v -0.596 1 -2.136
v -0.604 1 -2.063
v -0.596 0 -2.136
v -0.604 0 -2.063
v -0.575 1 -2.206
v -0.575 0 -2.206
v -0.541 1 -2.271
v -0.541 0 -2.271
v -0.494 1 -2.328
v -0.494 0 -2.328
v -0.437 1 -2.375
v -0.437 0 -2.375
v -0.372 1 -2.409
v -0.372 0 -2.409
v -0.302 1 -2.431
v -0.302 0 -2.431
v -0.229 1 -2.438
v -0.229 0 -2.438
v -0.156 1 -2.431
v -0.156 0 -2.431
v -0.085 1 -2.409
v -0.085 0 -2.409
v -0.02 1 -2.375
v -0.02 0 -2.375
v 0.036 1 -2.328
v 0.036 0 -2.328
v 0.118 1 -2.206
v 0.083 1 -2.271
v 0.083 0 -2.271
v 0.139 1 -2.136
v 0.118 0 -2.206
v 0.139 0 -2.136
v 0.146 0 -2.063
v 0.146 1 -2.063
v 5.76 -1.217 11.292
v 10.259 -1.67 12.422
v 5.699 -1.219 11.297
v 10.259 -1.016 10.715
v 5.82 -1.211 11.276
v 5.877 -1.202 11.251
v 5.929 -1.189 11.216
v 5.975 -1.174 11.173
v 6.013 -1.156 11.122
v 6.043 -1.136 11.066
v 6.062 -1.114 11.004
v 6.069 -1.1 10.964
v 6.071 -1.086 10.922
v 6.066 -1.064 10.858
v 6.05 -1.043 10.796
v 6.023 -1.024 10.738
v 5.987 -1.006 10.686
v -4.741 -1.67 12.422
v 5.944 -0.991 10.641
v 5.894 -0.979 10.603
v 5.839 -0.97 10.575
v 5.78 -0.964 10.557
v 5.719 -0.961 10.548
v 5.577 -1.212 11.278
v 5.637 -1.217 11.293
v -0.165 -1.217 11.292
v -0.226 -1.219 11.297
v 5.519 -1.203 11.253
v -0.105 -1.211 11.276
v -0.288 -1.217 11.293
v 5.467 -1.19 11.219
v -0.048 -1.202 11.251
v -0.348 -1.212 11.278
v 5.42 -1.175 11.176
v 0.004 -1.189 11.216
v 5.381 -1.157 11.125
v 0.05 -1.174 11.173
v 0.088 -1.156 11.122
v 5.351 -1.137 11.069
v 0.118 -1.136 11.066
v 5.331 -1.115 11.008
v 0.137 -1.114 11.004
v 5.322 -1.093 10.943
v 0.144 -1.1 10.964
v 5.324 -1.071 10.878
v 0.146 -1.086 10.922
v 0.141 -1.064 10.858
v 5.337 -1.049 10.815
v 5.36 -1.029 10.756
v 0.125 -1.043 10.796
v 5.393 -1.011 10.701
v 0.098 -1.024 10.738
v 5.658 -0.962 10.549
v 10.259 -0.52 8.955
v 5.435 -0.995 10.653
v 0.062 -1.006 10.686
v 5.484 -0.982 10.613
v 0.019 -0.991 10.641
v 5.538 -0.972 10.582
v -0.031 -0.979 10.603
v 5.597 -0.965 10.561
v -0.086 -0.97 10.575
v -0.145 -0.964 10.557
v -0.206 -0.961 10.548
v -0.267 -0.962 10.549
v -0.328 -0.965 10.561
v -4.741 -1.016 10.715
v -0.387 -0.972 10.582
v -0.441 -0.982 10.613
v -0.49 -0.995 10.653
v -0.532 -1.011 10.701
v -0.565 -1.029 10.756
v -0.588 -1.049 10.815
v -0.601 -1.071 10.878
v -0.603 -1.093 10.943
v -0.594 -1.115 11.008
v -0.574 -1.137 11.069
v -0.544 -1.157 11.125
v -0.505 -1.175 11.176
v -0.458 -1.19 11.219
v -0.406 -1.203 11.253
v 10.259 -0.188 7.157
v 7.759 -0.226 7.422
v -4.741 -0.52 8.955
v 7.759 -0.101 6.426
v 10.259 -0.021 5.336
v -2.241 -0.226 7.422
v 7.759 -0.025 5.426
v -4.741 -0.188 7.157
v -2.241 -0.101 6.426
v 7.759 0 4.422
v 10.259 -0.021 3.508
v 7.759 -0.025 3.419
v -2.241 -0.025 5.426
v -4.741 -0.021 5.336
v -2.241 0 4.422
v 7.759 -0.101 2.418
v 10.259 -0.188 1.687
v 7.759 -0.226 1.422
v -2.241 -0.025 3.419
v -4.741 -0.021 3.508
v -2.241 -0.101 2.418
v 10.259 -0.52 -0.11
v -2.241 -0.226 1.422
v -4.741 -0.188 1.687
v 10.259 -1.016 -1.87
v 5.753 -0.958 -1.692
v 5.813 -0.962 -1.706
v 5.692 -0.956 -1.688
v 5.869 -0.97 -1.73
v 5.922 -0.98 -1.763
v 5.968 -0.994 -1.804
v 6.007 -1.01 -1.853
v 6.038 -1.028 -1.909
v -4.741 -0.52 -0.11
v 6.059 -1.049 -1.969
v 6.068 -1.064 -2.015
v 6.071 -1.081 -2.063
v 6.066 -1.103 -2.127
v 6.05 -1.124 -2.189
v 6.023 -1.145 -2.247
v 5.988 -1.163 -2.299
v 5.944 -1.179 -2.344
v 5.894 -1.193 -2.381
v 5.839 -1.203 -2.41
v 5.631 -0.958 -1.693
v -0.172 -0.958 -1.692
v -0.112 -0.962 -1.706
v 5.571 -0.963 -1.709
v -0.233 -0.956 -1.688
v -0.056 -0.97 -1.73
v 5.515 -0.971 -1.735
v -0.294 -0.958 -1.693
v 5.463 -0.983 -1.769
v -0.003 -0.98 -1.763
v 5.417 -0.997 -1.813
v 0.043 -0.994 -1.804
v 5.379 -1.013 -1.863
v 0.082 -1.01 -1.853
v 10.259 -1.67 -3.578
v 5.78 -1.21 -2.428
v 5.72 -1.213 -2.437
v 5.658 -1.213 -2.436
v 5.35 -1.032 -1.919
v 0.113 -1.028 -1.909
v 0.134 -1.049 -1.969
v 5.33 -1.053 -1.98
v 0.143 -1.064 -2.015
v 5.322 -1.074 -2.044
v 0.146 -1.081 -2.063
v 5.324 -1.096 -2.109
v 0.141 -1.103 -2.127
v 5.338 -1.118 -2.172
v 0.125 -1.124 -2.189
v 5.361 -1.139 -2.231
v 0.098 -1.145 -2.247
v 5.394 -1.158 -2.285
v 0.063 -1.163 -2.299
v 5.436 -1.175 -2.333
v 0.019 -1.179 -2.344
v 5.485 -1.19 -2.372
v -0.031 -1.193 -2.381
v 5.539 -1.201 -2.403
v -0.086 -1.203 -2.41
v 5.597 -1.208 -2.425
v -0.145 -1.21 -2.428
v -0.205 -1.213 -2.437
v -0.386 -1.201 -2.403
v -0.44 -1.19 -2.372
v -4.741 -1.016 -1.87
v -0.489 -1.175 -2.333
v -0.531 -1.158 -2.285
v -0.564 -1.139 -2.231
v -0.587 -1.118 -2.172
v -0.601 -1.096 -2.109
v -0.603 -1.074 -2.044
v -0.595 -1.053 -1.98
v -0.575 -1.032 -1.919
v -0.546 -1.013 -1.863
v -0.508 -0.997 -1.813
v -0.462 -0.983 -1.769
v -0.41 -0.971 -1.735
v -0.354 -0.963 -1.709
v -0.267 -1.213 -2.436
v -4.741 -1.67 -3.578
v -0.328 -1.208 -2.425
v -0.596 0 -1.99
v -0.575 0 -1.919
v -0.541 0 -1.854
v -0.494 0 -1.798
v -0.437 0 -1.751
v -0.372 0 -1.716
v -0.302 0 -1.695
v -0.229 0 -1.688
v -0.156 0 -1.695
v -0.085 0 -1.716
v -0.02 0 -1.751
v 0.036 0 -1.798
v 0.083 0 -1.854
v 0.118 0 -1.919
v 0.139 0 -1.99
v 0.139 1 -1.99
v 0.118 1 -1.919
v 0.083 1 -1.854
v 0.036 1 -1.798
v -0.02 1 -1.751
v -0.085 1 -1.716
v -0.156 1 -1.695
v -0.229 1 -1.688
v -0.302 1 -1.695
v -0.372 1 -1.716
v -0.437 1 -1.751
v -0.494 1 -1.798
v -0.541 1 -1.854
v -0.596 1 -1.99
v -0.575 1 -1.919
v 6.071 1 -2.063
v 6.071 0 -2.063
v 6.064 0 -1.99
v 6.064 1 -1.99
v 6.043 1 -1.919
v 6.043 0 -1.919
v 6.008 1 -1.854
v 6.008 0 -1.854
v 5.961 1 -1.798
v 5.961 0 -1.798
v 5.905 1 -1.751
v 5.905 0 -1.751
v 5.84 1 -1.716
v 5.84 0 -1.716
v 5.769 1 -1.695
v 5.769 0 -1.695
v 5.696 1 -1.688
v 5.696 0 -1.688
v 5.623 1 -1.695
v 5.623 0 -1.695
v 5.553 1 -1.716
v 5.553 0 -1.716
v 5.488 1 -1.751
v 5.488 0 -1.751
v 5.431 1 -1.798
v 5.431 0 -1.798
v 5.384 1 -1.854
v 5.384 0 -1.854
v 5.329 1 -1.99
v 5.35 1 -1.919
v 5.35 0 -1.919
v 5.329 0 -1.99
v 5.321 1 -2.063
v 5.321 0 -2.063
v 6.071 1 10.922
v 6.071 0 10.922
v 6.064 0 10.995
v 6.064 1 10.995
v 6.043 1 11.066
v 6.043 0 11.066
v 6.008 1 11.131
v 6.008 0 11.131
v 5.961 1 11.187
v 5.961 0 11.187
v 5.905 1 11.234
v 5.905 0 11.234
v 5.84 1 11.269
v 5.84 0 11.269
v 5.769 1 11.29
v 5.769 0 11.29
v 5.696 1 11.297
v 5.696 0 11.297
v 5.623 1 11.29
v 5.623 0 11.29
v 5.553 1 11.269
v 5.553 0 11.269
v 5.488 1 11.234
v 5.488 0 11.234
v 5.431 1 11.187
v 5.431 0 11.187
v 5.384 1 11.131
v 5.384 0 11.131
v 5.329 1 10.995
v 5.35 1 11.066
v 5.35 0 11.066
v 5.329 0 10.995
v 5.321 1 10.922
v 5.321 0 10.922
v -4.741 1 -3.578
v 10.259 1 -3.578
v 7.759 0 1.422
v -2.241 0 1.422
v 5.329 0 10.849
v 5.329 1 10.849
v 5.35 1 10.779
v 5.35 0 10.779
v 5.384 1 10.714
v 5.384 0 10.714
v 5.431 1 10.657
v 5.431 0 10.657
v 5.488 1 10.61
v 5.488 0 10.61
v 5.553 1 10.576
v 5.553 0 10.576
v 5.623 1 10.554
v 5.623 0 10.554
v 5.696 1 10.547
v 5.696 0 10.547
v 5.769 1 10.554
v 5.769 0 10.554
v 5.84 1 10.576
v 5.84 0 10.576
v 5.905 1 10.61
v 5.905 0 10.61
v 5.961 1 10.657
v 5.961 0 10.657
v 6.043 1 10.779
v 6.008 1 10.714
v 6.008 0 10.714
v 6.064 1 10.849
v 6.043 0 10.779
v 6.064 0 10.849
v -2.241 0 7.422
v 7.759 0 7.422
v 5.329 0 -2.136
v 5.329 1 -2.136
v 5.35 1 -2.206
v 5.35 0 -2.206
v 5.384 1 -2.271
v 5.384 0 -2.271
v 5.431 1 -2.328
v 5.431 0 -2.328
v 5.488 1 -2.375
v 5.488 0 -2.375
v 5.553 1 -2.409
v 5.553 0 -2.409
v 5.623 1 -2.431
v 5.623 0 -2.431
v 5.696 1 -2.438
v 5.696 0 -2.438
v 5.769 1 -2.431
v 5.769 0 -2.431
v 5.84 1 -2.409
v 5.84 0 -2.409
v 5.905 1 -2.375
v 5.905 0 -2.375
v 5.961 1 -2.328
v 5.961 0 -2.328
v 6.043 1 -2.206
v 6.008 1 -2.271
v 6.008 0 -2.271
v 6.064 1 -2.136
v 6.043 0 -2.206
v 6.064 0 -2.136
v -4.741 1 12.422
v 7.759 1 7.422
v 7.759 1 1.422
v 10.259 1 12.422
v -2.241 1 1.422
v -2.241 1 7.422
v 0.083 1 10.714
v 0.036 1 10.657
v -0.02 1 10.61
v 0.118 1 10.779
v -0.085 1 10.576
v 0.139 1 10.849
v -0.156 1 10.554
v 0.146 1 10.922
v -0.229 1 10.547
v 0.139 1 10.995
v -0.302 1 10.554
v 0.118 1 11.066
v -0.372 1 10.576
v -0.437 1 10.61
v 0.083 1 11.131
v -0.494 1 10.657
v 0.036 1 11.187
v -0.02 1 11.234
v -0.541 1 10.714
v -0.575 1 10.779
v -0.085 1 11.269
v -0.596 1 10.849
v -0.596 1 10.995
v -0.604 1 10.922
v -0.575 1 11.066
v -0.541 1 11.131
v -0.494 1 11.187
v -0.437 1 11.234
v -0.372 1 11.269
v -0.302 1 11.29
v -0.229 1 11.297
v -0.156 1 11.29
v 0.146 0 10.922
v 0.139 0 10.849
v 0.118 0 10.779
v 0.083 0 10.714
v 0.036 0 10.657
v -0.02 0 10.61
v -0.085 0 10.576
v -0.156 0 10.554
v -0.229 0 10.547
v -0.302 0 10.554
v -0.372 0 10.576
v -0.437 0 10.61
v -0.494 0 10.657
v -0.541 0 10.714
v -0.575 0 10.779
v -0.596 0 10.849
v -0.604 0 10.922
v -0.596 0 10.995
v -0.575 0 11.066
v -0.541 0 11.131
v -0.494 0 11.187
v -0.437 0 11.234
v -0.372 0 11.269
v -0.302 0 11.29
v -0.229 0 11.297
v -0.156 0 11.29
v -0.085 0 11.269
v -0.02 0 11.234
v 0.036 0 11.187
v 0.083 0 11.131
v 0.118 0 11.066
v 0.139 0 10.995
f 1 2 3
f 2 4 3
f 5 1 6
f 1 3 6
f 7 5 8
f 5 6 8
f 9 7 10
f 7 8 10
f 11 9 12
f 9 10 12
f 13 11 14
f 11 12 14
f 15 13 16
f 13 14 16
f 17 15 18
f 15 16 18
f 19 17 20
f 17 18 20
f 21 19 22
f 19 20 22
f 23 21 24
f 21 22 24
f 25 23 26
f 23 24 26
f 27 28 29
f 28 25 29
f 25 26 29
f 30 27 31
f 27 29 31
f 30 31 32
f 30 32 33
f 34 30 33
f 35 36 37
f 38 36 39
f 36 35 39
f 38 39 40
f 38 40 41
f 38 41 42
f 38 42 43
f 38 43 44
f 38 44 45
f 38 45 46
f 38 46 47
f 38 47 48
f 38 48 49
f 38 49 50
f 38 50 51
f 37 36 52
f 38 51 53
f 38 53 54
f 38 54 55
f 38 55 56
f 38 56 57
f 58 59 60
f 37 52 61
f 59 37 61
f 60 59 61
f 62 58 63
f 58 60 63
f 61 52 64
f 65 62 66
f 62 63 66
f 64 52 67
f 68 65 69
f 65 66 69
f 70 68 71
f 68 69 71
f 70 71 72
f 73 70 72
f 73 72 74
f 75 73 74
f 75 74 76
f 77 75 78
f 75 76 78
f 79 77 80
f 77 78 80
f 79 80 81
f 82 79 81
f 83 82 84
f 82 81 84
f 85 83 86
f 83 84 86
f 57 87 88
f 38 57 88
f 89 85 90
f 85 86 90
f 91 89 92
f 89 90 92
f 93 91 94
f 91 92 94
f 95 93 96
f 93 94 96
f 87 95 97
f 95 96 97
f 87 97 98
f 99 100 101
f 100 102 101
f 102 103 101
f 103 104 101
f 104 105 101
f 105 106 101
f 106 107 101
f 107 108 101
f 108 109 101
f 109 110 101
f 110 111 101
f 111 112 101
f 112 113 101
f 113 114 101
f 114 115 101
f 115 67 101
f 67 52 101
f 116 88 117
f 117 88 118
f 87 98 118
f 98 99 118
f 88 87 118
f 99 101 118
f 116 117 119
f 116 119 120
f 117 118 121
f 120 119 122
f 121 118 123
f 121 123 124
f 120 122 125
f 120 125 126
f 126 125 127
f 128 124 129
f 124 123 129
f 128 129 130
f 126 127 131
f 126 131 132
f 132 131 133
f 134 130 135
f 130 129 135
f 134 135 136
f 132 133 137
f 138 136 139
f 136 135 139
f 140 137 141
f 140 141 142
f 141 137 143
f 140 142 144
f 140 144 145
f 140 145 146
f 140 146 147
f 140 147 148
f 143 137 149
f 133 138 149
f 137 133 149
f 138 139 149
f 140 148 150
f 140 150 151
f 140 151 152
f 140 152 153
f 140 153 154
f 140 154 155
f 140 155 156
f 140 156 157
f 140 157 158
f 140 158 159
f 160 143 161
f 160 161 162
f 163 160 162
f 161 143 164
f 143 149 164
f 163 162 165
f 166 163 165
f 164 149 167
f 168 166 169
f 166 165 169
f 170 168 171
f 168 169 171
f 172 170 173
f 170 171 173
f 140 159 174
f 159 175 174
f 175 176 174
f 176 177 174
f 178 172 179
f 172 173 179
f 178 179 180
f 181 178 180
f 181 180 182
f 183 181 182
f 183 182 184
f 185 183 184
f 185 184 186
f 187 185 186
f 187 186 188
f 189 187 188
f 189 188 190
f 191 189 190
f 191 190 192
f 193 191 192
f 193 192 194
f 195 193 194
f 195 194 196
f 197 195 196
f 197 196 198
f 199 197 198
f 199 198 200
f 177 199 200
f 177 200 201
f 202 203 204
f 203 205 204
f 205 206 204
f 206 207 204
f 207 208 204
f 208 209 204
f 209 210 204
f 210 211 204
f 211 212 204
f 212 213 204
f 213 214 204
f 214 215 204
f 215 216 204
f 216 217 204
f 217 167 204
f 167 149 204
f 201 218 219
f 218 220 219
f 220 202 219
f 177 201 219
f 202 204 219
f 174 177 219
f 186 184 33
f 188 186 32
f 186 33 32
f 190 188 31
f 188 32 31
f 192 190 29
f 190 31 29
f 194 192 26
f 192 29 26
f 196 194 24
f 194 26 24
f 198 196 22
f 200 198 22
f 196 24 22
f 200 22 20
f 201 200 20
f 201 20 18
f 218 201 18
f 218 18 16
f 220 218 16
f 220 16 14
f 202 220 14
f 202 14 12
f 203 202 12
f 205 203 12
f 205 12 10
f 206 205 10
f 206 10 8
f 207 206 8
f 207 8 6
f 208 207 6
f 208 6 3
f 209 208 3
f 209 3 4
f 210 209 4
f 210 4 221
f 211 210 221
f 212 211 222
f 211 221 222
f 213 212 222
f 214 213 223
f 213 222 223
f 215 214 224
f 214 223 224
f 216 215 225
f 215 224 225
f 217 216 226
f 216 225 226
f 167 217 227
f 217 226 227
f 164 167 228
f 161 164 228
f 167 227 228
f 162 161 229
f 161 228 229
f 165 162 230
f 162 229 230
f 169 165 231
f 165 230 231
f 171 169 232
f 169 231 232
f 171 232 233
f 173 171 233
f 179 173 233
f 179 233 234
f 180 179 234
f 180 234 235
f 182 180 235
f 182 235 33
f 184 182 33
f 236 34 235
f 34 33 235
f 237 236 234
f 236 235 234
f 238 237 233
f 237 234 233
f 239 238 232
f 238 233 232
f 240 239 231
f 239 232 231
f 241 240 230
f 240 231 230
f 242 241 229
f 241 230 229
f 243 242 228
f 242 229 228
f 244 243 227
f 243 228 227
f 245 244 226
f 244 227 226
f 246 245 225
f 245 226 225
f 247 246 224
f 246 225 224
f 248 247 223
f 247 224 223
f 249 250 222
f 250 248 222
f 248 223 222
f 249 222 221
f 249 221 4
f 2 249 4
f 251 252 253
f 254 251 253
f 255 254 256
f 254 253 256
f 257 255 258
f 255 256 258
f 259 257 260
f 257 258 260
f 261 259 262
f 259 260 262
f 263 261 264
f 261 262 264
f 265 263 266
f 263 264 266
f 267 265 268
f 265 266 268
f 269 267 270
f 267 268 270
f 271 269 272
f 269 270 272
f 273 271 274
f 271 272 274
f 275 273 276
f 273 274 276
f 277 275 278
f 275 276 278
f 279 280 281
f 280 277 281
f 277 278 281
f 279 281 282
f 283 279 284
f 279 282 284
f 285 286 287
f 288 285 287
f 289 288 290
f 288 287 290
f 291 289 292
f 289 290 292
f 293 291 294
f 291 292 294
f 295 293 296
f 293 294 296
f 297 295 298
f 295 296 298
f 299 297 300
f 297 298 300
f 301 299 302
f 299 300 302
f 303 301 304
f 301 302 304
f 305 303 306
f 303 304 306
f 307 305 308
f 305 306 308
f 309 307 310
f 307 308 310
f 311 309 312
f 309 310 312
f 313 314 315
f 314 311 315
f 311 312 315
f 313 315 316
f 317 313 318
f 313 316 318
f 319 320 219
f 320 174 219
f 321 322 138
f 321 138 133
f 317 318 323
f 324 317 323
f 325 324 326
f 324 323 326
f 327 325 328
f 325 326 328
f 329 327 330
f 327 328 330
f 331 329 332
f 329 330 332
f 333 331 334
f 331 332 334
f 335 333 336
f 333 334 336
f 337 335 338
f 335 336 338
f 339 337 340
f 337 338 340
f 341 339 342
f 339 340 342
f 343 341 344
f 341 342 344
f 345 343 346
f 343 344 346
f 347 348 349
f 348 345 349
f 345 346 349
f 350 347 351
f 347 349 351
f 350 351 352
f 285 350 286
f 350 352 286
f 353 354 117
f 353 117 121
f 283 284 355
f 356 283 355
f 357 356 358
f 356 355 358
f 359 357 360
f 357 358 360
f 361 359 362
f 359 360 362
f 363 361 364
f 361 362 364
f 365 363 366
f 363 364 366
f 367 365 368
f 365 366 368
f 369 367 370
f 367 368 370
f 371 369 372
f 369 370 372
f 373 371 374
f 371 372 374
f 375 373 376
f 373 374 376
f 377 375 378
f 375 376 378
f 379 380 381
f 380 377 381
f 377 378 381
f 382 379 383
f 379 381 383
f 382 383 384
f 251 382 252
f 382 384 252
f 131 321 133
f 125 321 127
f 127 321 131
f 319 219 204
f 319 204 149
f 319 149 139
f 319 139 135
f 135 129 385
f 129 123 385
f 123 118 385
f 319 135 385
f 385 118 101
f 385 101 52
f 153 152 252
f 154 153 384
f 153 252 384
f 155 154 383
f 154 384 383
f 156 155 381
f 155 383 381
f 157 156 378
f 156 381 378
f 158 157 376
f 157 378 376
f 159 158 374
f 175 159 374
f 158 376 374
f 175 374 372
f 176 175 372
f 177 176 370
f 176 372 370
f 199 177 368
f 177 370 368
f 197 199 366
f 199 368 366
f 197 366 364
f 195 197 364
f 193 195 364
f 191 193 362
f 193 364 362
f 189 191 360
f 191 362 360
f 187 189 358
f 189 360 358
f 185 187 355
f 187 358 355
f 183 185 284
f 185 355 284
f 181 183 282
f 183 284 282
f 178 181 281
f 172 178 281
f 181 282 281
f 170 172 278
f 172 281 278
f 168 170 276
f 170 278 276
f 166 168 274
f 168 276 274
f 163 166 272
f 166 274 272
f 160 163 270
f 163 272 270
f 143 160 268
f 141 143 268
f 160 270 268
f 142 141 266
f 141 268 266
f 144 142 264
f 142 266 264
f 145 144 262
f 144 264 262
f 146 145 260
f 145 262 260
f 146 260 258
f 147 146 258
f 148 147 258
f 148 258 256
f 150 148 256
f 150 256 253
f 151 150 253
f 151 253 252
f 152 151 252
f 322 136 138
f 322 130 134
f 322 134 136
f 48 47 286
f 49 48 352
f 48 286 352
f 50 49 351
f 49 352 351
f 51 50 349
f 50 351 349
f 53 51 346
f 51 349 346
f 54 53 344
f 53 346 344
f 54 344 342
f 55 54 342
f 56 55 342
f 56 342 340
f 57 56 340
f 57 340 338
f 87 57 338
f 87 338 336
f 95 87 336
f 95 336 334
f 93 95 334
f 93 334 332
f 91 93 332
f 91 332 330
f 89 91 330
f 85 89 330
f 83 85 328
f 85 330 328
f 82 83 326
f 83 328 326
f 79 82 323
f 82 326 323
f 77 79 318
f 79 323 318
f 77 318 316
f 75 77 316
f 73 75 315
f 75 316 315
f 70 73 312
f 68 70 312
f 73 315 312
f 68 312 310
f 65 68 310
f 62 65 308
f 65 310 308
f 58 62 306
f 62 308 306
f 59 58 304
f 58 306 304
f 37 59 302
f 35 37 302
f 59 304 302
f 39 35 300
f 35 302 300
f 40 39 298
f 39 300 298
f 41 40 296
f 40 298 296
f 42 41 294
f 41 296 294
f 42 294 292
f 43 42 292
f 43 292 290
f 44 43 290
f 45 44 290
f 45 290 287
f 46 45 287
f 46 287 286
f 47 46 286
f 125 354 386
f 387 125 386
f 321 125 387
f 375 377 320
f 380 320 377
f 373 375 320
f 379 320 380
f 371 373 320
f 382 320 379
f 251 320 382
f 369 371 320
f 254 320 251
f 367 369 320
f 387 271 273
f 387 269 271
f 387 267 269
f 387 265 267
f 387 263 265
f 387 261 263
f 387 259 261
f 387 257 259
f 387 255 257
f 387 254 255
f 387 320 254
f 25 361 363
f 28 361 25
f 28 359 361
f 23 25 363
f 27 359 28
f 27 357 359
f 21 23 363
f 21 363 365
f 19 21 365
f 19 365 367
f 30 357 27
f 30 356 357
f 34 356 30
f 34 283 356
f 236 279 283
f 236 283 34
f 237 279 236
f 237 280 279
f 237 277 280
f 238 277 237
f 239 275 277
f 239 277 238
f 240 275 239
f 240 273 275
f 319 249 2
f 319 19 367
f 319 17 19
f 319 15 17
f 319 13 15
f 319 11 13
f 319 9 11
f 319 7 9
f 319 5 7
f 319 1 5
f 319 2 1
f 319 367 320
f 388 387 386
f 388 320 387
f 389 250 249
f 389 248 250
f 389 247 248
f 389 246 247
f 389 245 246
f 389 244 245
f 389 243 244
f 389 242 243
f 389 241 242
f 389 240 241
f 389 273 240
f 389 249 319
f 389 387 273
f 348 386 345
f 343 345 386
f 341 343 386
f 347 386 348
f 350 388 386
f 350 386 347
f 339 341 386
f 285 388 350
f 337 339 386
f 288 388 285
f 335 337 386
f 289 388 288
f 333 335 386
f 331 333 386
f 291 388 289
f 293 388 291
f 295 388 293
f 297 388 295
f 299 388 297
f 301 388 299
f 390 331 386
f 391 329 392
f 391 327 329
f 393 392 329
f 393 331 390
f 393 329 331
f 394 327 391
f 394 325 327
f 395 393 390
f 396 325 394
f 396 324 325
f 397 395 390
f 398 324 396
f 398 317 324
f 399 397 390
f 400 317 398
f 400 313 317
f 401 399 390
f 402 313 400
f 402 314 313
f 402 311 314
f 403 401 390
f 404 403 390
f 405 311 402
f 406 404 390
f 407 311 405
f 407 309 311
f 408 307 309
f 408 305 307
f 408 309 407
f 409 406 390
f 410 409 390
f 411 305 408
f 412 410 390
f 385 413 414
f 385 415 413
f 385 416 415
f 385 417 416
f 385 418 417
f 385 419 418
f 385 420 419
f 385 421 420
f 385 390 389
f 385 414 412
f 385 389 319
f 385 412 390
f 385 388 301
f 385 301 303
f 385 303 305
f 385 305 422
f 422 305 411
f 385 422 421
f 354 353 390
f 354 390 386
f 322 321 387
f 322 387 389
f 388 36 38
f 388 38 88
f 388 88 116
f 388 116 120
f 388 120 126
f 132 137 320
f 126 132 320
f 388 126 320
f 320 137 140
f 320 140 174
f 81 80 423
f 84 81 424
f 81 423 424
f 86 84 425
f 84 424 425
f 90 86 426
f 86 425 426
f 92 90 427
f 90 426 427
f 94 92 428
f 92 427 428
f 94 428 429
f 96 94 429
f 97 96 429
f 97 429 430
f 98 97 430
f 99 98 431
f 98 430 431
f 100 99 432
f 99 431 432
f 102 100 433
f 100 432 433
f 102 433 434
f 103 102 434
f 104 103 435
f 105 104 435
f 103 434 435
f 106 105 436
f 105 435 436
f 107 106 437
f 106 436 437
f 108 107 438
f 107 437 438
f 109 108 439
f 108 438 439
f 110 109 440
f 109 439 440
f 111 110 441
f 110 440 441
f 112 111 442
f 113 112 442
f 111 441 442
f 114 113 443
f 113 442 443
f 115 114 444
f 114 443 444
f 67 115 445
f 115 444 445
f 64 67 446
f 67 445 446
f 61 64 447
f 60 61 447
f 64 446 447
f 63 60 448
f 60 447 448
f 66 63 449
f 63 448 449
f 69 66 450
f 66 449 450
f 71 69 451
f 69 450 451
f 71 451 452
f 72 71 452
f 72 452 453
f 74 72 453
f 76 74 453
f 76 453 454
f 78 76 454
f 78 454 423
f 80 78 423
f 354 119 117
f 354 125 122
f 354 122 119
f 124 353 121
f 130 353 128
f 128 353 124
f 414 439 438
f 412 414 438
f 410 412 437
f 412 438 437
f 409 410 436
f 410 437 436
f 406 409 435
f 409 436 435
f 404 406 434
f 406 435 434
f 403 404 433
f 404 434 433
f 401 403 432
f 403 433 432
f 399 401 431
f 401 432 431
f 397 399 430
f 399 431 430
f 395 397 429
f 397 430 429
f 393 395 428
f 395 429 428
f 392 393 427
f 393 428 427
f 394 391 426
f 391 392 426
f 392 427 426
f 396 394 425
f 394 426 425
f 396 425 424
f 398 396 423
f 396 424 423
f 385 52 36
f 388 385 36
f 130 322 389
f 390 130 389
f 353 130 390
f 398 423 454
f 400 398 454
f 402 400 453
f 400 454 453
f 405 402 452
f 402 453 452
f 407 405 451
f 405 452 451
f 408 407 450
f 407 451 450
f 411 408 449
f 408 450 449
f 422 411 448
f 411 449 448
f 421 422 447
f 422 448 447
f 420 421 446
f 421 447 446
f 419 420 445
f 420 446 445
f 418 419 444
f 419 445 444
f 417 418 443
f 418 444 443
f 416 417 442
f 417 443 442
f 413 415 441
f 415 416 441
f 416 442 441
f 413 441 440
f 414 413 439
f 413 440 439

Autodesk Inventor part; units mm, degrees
ref_plane "YZ Plane" through (0, 0, 0) normal (1, 0, 0) x (0, 1, 0)
ref_plane "XZ Plane" through (0, 0, 0) normal (0, 1, 0) x (-1, 0, 0)
ref_plane "XY Plane" through (0, 0, 0) normal (0, 0, 1) x (1, 0, 0)
sketch "Sketch1" plane through (0, 0, 0) normal (0, 1, 0) x (-1, 0, 0)
  line L0 (4.7412, 12.4222) -> (-10.2588, 12.4222)
  line L1 (-10.2588, 12.4222) -> (-10.2588, -3.5778)
  line L2 (-10.2588, -3.5778) -> (4.7412, -3.5778)
  line L3 (4.7412, -3.5778) -> (4.7412, 12.4222)
  line L4 (2.2412, 7.4222) -> (-7.7588, 7.4222)
  line L5 (-7.7588, 7.4222) -> (-7.7588, 1.4222)
  line L6 (-7.7588, 1.4222) -> (2.2412, 1.4222)
  line L7 (2.2412, 1.4222) -> (2.2412, 7.4222)
  circle A0 centre (0.2287, 10.9222) radius 0.375
  circle A1 centre (-5.6963, 10.9222) radius 0.375
  circle A2 centre (0.2287, -2.0628) radius 0.375
  circle A3 centre (-5.6963, -2.0628) radius 0.375
  point P0 (0, 0)
  dimension "d0" = 15
  dimension "d1" = 16
  dimension "d2" = 10
  dimension "d3" = 6
  dimension "d4" = 2.5
  dimension "d5" = 5
  dimension "d6" = 0.75
  dimension "d7" = 4.5125
  dimension "d8" = 1.5
  dimension "d11" = 5.925
  dimension "d14" = 12.985
extrude "Extrusion1" add sketch "Sketch1" along normal blind 1
sketch "Sketch2" plane through (-4.7412, 0, -3.5778) normal (-1, 0, 0) x (0, 0, 1)
  circle A0 centre (8, -20) radius 20 projected
  line L0 (16, 0) -> (16, 1) projected
  line L1 (16, 0) -> (16, -1.6697)
  line L2 (16, 0) -> (0, 0) projected
  line L3 (0, 0) -> (0, -1.6697)
  arc A1 (16, -1.6697) -> (0, -1.6697) centre (8, -20) ccw
  point P0 (3.5778, 0)
  point P1 (8, 0)
extrude "Extrusion2" add sketch "Sketch2" against normal up to surface (15 mm away) contours A0 L2 L1 | L3 L2 A0
sketch "Sketch3" plane through (0, 1, 0) normal (0, 1, 0) x (1, 0, 0)
  circle A0 centre (-0.2287, -10.9222) radius 0.375 projected
  circle A1 centre (5.6963, -10.9222) radius 0.375 projected
  circle A2 centre (-0.2287, 2.0628) radius 0.375 projected
  circle A3 centre (5.6963, 2.0628) radius 0.375 projected
  line L0 (-2.2412, -1.4222) -> (7.7588, -1.4222) projected
  line L1 (-2.2412, -7.4222) -> (-2.2412, -1.4222) projected
  line L2 (7.7588, -7.4222) -> (-2.2412, -7.4222) projected
  line L3 (7.7588, -1.4222) -> (7.7588, -7.4222) projected
  line L4 (-2.2412, -7.4222) -> (7.7588, -7.4222)
  line L5 (7.7588, -7.4222) -> (7.7588, -1.4222)
  line L6 (7.7588, -1.4222) -> (-2.2412, -1.4222)
  line L7 (-2.2412, -1.4222) -> (-2.2412, -7.4222)
  circle A4 centre (5.6963, 2.0628) radius 0.375
  circle A5 centre (-0.2287, 2.0628) radius 0.375
  circle A6 centre (-0.2287, -10.9222) radius 0.375
  circle A7 centre (5.6963, -10.9222) radius 0.375
  point P0 (0, 0)
extrude "Extrusion3" cut sketch "Sketch3" against normal through all
properties part number "Viewing Mirror Holder Mount"
